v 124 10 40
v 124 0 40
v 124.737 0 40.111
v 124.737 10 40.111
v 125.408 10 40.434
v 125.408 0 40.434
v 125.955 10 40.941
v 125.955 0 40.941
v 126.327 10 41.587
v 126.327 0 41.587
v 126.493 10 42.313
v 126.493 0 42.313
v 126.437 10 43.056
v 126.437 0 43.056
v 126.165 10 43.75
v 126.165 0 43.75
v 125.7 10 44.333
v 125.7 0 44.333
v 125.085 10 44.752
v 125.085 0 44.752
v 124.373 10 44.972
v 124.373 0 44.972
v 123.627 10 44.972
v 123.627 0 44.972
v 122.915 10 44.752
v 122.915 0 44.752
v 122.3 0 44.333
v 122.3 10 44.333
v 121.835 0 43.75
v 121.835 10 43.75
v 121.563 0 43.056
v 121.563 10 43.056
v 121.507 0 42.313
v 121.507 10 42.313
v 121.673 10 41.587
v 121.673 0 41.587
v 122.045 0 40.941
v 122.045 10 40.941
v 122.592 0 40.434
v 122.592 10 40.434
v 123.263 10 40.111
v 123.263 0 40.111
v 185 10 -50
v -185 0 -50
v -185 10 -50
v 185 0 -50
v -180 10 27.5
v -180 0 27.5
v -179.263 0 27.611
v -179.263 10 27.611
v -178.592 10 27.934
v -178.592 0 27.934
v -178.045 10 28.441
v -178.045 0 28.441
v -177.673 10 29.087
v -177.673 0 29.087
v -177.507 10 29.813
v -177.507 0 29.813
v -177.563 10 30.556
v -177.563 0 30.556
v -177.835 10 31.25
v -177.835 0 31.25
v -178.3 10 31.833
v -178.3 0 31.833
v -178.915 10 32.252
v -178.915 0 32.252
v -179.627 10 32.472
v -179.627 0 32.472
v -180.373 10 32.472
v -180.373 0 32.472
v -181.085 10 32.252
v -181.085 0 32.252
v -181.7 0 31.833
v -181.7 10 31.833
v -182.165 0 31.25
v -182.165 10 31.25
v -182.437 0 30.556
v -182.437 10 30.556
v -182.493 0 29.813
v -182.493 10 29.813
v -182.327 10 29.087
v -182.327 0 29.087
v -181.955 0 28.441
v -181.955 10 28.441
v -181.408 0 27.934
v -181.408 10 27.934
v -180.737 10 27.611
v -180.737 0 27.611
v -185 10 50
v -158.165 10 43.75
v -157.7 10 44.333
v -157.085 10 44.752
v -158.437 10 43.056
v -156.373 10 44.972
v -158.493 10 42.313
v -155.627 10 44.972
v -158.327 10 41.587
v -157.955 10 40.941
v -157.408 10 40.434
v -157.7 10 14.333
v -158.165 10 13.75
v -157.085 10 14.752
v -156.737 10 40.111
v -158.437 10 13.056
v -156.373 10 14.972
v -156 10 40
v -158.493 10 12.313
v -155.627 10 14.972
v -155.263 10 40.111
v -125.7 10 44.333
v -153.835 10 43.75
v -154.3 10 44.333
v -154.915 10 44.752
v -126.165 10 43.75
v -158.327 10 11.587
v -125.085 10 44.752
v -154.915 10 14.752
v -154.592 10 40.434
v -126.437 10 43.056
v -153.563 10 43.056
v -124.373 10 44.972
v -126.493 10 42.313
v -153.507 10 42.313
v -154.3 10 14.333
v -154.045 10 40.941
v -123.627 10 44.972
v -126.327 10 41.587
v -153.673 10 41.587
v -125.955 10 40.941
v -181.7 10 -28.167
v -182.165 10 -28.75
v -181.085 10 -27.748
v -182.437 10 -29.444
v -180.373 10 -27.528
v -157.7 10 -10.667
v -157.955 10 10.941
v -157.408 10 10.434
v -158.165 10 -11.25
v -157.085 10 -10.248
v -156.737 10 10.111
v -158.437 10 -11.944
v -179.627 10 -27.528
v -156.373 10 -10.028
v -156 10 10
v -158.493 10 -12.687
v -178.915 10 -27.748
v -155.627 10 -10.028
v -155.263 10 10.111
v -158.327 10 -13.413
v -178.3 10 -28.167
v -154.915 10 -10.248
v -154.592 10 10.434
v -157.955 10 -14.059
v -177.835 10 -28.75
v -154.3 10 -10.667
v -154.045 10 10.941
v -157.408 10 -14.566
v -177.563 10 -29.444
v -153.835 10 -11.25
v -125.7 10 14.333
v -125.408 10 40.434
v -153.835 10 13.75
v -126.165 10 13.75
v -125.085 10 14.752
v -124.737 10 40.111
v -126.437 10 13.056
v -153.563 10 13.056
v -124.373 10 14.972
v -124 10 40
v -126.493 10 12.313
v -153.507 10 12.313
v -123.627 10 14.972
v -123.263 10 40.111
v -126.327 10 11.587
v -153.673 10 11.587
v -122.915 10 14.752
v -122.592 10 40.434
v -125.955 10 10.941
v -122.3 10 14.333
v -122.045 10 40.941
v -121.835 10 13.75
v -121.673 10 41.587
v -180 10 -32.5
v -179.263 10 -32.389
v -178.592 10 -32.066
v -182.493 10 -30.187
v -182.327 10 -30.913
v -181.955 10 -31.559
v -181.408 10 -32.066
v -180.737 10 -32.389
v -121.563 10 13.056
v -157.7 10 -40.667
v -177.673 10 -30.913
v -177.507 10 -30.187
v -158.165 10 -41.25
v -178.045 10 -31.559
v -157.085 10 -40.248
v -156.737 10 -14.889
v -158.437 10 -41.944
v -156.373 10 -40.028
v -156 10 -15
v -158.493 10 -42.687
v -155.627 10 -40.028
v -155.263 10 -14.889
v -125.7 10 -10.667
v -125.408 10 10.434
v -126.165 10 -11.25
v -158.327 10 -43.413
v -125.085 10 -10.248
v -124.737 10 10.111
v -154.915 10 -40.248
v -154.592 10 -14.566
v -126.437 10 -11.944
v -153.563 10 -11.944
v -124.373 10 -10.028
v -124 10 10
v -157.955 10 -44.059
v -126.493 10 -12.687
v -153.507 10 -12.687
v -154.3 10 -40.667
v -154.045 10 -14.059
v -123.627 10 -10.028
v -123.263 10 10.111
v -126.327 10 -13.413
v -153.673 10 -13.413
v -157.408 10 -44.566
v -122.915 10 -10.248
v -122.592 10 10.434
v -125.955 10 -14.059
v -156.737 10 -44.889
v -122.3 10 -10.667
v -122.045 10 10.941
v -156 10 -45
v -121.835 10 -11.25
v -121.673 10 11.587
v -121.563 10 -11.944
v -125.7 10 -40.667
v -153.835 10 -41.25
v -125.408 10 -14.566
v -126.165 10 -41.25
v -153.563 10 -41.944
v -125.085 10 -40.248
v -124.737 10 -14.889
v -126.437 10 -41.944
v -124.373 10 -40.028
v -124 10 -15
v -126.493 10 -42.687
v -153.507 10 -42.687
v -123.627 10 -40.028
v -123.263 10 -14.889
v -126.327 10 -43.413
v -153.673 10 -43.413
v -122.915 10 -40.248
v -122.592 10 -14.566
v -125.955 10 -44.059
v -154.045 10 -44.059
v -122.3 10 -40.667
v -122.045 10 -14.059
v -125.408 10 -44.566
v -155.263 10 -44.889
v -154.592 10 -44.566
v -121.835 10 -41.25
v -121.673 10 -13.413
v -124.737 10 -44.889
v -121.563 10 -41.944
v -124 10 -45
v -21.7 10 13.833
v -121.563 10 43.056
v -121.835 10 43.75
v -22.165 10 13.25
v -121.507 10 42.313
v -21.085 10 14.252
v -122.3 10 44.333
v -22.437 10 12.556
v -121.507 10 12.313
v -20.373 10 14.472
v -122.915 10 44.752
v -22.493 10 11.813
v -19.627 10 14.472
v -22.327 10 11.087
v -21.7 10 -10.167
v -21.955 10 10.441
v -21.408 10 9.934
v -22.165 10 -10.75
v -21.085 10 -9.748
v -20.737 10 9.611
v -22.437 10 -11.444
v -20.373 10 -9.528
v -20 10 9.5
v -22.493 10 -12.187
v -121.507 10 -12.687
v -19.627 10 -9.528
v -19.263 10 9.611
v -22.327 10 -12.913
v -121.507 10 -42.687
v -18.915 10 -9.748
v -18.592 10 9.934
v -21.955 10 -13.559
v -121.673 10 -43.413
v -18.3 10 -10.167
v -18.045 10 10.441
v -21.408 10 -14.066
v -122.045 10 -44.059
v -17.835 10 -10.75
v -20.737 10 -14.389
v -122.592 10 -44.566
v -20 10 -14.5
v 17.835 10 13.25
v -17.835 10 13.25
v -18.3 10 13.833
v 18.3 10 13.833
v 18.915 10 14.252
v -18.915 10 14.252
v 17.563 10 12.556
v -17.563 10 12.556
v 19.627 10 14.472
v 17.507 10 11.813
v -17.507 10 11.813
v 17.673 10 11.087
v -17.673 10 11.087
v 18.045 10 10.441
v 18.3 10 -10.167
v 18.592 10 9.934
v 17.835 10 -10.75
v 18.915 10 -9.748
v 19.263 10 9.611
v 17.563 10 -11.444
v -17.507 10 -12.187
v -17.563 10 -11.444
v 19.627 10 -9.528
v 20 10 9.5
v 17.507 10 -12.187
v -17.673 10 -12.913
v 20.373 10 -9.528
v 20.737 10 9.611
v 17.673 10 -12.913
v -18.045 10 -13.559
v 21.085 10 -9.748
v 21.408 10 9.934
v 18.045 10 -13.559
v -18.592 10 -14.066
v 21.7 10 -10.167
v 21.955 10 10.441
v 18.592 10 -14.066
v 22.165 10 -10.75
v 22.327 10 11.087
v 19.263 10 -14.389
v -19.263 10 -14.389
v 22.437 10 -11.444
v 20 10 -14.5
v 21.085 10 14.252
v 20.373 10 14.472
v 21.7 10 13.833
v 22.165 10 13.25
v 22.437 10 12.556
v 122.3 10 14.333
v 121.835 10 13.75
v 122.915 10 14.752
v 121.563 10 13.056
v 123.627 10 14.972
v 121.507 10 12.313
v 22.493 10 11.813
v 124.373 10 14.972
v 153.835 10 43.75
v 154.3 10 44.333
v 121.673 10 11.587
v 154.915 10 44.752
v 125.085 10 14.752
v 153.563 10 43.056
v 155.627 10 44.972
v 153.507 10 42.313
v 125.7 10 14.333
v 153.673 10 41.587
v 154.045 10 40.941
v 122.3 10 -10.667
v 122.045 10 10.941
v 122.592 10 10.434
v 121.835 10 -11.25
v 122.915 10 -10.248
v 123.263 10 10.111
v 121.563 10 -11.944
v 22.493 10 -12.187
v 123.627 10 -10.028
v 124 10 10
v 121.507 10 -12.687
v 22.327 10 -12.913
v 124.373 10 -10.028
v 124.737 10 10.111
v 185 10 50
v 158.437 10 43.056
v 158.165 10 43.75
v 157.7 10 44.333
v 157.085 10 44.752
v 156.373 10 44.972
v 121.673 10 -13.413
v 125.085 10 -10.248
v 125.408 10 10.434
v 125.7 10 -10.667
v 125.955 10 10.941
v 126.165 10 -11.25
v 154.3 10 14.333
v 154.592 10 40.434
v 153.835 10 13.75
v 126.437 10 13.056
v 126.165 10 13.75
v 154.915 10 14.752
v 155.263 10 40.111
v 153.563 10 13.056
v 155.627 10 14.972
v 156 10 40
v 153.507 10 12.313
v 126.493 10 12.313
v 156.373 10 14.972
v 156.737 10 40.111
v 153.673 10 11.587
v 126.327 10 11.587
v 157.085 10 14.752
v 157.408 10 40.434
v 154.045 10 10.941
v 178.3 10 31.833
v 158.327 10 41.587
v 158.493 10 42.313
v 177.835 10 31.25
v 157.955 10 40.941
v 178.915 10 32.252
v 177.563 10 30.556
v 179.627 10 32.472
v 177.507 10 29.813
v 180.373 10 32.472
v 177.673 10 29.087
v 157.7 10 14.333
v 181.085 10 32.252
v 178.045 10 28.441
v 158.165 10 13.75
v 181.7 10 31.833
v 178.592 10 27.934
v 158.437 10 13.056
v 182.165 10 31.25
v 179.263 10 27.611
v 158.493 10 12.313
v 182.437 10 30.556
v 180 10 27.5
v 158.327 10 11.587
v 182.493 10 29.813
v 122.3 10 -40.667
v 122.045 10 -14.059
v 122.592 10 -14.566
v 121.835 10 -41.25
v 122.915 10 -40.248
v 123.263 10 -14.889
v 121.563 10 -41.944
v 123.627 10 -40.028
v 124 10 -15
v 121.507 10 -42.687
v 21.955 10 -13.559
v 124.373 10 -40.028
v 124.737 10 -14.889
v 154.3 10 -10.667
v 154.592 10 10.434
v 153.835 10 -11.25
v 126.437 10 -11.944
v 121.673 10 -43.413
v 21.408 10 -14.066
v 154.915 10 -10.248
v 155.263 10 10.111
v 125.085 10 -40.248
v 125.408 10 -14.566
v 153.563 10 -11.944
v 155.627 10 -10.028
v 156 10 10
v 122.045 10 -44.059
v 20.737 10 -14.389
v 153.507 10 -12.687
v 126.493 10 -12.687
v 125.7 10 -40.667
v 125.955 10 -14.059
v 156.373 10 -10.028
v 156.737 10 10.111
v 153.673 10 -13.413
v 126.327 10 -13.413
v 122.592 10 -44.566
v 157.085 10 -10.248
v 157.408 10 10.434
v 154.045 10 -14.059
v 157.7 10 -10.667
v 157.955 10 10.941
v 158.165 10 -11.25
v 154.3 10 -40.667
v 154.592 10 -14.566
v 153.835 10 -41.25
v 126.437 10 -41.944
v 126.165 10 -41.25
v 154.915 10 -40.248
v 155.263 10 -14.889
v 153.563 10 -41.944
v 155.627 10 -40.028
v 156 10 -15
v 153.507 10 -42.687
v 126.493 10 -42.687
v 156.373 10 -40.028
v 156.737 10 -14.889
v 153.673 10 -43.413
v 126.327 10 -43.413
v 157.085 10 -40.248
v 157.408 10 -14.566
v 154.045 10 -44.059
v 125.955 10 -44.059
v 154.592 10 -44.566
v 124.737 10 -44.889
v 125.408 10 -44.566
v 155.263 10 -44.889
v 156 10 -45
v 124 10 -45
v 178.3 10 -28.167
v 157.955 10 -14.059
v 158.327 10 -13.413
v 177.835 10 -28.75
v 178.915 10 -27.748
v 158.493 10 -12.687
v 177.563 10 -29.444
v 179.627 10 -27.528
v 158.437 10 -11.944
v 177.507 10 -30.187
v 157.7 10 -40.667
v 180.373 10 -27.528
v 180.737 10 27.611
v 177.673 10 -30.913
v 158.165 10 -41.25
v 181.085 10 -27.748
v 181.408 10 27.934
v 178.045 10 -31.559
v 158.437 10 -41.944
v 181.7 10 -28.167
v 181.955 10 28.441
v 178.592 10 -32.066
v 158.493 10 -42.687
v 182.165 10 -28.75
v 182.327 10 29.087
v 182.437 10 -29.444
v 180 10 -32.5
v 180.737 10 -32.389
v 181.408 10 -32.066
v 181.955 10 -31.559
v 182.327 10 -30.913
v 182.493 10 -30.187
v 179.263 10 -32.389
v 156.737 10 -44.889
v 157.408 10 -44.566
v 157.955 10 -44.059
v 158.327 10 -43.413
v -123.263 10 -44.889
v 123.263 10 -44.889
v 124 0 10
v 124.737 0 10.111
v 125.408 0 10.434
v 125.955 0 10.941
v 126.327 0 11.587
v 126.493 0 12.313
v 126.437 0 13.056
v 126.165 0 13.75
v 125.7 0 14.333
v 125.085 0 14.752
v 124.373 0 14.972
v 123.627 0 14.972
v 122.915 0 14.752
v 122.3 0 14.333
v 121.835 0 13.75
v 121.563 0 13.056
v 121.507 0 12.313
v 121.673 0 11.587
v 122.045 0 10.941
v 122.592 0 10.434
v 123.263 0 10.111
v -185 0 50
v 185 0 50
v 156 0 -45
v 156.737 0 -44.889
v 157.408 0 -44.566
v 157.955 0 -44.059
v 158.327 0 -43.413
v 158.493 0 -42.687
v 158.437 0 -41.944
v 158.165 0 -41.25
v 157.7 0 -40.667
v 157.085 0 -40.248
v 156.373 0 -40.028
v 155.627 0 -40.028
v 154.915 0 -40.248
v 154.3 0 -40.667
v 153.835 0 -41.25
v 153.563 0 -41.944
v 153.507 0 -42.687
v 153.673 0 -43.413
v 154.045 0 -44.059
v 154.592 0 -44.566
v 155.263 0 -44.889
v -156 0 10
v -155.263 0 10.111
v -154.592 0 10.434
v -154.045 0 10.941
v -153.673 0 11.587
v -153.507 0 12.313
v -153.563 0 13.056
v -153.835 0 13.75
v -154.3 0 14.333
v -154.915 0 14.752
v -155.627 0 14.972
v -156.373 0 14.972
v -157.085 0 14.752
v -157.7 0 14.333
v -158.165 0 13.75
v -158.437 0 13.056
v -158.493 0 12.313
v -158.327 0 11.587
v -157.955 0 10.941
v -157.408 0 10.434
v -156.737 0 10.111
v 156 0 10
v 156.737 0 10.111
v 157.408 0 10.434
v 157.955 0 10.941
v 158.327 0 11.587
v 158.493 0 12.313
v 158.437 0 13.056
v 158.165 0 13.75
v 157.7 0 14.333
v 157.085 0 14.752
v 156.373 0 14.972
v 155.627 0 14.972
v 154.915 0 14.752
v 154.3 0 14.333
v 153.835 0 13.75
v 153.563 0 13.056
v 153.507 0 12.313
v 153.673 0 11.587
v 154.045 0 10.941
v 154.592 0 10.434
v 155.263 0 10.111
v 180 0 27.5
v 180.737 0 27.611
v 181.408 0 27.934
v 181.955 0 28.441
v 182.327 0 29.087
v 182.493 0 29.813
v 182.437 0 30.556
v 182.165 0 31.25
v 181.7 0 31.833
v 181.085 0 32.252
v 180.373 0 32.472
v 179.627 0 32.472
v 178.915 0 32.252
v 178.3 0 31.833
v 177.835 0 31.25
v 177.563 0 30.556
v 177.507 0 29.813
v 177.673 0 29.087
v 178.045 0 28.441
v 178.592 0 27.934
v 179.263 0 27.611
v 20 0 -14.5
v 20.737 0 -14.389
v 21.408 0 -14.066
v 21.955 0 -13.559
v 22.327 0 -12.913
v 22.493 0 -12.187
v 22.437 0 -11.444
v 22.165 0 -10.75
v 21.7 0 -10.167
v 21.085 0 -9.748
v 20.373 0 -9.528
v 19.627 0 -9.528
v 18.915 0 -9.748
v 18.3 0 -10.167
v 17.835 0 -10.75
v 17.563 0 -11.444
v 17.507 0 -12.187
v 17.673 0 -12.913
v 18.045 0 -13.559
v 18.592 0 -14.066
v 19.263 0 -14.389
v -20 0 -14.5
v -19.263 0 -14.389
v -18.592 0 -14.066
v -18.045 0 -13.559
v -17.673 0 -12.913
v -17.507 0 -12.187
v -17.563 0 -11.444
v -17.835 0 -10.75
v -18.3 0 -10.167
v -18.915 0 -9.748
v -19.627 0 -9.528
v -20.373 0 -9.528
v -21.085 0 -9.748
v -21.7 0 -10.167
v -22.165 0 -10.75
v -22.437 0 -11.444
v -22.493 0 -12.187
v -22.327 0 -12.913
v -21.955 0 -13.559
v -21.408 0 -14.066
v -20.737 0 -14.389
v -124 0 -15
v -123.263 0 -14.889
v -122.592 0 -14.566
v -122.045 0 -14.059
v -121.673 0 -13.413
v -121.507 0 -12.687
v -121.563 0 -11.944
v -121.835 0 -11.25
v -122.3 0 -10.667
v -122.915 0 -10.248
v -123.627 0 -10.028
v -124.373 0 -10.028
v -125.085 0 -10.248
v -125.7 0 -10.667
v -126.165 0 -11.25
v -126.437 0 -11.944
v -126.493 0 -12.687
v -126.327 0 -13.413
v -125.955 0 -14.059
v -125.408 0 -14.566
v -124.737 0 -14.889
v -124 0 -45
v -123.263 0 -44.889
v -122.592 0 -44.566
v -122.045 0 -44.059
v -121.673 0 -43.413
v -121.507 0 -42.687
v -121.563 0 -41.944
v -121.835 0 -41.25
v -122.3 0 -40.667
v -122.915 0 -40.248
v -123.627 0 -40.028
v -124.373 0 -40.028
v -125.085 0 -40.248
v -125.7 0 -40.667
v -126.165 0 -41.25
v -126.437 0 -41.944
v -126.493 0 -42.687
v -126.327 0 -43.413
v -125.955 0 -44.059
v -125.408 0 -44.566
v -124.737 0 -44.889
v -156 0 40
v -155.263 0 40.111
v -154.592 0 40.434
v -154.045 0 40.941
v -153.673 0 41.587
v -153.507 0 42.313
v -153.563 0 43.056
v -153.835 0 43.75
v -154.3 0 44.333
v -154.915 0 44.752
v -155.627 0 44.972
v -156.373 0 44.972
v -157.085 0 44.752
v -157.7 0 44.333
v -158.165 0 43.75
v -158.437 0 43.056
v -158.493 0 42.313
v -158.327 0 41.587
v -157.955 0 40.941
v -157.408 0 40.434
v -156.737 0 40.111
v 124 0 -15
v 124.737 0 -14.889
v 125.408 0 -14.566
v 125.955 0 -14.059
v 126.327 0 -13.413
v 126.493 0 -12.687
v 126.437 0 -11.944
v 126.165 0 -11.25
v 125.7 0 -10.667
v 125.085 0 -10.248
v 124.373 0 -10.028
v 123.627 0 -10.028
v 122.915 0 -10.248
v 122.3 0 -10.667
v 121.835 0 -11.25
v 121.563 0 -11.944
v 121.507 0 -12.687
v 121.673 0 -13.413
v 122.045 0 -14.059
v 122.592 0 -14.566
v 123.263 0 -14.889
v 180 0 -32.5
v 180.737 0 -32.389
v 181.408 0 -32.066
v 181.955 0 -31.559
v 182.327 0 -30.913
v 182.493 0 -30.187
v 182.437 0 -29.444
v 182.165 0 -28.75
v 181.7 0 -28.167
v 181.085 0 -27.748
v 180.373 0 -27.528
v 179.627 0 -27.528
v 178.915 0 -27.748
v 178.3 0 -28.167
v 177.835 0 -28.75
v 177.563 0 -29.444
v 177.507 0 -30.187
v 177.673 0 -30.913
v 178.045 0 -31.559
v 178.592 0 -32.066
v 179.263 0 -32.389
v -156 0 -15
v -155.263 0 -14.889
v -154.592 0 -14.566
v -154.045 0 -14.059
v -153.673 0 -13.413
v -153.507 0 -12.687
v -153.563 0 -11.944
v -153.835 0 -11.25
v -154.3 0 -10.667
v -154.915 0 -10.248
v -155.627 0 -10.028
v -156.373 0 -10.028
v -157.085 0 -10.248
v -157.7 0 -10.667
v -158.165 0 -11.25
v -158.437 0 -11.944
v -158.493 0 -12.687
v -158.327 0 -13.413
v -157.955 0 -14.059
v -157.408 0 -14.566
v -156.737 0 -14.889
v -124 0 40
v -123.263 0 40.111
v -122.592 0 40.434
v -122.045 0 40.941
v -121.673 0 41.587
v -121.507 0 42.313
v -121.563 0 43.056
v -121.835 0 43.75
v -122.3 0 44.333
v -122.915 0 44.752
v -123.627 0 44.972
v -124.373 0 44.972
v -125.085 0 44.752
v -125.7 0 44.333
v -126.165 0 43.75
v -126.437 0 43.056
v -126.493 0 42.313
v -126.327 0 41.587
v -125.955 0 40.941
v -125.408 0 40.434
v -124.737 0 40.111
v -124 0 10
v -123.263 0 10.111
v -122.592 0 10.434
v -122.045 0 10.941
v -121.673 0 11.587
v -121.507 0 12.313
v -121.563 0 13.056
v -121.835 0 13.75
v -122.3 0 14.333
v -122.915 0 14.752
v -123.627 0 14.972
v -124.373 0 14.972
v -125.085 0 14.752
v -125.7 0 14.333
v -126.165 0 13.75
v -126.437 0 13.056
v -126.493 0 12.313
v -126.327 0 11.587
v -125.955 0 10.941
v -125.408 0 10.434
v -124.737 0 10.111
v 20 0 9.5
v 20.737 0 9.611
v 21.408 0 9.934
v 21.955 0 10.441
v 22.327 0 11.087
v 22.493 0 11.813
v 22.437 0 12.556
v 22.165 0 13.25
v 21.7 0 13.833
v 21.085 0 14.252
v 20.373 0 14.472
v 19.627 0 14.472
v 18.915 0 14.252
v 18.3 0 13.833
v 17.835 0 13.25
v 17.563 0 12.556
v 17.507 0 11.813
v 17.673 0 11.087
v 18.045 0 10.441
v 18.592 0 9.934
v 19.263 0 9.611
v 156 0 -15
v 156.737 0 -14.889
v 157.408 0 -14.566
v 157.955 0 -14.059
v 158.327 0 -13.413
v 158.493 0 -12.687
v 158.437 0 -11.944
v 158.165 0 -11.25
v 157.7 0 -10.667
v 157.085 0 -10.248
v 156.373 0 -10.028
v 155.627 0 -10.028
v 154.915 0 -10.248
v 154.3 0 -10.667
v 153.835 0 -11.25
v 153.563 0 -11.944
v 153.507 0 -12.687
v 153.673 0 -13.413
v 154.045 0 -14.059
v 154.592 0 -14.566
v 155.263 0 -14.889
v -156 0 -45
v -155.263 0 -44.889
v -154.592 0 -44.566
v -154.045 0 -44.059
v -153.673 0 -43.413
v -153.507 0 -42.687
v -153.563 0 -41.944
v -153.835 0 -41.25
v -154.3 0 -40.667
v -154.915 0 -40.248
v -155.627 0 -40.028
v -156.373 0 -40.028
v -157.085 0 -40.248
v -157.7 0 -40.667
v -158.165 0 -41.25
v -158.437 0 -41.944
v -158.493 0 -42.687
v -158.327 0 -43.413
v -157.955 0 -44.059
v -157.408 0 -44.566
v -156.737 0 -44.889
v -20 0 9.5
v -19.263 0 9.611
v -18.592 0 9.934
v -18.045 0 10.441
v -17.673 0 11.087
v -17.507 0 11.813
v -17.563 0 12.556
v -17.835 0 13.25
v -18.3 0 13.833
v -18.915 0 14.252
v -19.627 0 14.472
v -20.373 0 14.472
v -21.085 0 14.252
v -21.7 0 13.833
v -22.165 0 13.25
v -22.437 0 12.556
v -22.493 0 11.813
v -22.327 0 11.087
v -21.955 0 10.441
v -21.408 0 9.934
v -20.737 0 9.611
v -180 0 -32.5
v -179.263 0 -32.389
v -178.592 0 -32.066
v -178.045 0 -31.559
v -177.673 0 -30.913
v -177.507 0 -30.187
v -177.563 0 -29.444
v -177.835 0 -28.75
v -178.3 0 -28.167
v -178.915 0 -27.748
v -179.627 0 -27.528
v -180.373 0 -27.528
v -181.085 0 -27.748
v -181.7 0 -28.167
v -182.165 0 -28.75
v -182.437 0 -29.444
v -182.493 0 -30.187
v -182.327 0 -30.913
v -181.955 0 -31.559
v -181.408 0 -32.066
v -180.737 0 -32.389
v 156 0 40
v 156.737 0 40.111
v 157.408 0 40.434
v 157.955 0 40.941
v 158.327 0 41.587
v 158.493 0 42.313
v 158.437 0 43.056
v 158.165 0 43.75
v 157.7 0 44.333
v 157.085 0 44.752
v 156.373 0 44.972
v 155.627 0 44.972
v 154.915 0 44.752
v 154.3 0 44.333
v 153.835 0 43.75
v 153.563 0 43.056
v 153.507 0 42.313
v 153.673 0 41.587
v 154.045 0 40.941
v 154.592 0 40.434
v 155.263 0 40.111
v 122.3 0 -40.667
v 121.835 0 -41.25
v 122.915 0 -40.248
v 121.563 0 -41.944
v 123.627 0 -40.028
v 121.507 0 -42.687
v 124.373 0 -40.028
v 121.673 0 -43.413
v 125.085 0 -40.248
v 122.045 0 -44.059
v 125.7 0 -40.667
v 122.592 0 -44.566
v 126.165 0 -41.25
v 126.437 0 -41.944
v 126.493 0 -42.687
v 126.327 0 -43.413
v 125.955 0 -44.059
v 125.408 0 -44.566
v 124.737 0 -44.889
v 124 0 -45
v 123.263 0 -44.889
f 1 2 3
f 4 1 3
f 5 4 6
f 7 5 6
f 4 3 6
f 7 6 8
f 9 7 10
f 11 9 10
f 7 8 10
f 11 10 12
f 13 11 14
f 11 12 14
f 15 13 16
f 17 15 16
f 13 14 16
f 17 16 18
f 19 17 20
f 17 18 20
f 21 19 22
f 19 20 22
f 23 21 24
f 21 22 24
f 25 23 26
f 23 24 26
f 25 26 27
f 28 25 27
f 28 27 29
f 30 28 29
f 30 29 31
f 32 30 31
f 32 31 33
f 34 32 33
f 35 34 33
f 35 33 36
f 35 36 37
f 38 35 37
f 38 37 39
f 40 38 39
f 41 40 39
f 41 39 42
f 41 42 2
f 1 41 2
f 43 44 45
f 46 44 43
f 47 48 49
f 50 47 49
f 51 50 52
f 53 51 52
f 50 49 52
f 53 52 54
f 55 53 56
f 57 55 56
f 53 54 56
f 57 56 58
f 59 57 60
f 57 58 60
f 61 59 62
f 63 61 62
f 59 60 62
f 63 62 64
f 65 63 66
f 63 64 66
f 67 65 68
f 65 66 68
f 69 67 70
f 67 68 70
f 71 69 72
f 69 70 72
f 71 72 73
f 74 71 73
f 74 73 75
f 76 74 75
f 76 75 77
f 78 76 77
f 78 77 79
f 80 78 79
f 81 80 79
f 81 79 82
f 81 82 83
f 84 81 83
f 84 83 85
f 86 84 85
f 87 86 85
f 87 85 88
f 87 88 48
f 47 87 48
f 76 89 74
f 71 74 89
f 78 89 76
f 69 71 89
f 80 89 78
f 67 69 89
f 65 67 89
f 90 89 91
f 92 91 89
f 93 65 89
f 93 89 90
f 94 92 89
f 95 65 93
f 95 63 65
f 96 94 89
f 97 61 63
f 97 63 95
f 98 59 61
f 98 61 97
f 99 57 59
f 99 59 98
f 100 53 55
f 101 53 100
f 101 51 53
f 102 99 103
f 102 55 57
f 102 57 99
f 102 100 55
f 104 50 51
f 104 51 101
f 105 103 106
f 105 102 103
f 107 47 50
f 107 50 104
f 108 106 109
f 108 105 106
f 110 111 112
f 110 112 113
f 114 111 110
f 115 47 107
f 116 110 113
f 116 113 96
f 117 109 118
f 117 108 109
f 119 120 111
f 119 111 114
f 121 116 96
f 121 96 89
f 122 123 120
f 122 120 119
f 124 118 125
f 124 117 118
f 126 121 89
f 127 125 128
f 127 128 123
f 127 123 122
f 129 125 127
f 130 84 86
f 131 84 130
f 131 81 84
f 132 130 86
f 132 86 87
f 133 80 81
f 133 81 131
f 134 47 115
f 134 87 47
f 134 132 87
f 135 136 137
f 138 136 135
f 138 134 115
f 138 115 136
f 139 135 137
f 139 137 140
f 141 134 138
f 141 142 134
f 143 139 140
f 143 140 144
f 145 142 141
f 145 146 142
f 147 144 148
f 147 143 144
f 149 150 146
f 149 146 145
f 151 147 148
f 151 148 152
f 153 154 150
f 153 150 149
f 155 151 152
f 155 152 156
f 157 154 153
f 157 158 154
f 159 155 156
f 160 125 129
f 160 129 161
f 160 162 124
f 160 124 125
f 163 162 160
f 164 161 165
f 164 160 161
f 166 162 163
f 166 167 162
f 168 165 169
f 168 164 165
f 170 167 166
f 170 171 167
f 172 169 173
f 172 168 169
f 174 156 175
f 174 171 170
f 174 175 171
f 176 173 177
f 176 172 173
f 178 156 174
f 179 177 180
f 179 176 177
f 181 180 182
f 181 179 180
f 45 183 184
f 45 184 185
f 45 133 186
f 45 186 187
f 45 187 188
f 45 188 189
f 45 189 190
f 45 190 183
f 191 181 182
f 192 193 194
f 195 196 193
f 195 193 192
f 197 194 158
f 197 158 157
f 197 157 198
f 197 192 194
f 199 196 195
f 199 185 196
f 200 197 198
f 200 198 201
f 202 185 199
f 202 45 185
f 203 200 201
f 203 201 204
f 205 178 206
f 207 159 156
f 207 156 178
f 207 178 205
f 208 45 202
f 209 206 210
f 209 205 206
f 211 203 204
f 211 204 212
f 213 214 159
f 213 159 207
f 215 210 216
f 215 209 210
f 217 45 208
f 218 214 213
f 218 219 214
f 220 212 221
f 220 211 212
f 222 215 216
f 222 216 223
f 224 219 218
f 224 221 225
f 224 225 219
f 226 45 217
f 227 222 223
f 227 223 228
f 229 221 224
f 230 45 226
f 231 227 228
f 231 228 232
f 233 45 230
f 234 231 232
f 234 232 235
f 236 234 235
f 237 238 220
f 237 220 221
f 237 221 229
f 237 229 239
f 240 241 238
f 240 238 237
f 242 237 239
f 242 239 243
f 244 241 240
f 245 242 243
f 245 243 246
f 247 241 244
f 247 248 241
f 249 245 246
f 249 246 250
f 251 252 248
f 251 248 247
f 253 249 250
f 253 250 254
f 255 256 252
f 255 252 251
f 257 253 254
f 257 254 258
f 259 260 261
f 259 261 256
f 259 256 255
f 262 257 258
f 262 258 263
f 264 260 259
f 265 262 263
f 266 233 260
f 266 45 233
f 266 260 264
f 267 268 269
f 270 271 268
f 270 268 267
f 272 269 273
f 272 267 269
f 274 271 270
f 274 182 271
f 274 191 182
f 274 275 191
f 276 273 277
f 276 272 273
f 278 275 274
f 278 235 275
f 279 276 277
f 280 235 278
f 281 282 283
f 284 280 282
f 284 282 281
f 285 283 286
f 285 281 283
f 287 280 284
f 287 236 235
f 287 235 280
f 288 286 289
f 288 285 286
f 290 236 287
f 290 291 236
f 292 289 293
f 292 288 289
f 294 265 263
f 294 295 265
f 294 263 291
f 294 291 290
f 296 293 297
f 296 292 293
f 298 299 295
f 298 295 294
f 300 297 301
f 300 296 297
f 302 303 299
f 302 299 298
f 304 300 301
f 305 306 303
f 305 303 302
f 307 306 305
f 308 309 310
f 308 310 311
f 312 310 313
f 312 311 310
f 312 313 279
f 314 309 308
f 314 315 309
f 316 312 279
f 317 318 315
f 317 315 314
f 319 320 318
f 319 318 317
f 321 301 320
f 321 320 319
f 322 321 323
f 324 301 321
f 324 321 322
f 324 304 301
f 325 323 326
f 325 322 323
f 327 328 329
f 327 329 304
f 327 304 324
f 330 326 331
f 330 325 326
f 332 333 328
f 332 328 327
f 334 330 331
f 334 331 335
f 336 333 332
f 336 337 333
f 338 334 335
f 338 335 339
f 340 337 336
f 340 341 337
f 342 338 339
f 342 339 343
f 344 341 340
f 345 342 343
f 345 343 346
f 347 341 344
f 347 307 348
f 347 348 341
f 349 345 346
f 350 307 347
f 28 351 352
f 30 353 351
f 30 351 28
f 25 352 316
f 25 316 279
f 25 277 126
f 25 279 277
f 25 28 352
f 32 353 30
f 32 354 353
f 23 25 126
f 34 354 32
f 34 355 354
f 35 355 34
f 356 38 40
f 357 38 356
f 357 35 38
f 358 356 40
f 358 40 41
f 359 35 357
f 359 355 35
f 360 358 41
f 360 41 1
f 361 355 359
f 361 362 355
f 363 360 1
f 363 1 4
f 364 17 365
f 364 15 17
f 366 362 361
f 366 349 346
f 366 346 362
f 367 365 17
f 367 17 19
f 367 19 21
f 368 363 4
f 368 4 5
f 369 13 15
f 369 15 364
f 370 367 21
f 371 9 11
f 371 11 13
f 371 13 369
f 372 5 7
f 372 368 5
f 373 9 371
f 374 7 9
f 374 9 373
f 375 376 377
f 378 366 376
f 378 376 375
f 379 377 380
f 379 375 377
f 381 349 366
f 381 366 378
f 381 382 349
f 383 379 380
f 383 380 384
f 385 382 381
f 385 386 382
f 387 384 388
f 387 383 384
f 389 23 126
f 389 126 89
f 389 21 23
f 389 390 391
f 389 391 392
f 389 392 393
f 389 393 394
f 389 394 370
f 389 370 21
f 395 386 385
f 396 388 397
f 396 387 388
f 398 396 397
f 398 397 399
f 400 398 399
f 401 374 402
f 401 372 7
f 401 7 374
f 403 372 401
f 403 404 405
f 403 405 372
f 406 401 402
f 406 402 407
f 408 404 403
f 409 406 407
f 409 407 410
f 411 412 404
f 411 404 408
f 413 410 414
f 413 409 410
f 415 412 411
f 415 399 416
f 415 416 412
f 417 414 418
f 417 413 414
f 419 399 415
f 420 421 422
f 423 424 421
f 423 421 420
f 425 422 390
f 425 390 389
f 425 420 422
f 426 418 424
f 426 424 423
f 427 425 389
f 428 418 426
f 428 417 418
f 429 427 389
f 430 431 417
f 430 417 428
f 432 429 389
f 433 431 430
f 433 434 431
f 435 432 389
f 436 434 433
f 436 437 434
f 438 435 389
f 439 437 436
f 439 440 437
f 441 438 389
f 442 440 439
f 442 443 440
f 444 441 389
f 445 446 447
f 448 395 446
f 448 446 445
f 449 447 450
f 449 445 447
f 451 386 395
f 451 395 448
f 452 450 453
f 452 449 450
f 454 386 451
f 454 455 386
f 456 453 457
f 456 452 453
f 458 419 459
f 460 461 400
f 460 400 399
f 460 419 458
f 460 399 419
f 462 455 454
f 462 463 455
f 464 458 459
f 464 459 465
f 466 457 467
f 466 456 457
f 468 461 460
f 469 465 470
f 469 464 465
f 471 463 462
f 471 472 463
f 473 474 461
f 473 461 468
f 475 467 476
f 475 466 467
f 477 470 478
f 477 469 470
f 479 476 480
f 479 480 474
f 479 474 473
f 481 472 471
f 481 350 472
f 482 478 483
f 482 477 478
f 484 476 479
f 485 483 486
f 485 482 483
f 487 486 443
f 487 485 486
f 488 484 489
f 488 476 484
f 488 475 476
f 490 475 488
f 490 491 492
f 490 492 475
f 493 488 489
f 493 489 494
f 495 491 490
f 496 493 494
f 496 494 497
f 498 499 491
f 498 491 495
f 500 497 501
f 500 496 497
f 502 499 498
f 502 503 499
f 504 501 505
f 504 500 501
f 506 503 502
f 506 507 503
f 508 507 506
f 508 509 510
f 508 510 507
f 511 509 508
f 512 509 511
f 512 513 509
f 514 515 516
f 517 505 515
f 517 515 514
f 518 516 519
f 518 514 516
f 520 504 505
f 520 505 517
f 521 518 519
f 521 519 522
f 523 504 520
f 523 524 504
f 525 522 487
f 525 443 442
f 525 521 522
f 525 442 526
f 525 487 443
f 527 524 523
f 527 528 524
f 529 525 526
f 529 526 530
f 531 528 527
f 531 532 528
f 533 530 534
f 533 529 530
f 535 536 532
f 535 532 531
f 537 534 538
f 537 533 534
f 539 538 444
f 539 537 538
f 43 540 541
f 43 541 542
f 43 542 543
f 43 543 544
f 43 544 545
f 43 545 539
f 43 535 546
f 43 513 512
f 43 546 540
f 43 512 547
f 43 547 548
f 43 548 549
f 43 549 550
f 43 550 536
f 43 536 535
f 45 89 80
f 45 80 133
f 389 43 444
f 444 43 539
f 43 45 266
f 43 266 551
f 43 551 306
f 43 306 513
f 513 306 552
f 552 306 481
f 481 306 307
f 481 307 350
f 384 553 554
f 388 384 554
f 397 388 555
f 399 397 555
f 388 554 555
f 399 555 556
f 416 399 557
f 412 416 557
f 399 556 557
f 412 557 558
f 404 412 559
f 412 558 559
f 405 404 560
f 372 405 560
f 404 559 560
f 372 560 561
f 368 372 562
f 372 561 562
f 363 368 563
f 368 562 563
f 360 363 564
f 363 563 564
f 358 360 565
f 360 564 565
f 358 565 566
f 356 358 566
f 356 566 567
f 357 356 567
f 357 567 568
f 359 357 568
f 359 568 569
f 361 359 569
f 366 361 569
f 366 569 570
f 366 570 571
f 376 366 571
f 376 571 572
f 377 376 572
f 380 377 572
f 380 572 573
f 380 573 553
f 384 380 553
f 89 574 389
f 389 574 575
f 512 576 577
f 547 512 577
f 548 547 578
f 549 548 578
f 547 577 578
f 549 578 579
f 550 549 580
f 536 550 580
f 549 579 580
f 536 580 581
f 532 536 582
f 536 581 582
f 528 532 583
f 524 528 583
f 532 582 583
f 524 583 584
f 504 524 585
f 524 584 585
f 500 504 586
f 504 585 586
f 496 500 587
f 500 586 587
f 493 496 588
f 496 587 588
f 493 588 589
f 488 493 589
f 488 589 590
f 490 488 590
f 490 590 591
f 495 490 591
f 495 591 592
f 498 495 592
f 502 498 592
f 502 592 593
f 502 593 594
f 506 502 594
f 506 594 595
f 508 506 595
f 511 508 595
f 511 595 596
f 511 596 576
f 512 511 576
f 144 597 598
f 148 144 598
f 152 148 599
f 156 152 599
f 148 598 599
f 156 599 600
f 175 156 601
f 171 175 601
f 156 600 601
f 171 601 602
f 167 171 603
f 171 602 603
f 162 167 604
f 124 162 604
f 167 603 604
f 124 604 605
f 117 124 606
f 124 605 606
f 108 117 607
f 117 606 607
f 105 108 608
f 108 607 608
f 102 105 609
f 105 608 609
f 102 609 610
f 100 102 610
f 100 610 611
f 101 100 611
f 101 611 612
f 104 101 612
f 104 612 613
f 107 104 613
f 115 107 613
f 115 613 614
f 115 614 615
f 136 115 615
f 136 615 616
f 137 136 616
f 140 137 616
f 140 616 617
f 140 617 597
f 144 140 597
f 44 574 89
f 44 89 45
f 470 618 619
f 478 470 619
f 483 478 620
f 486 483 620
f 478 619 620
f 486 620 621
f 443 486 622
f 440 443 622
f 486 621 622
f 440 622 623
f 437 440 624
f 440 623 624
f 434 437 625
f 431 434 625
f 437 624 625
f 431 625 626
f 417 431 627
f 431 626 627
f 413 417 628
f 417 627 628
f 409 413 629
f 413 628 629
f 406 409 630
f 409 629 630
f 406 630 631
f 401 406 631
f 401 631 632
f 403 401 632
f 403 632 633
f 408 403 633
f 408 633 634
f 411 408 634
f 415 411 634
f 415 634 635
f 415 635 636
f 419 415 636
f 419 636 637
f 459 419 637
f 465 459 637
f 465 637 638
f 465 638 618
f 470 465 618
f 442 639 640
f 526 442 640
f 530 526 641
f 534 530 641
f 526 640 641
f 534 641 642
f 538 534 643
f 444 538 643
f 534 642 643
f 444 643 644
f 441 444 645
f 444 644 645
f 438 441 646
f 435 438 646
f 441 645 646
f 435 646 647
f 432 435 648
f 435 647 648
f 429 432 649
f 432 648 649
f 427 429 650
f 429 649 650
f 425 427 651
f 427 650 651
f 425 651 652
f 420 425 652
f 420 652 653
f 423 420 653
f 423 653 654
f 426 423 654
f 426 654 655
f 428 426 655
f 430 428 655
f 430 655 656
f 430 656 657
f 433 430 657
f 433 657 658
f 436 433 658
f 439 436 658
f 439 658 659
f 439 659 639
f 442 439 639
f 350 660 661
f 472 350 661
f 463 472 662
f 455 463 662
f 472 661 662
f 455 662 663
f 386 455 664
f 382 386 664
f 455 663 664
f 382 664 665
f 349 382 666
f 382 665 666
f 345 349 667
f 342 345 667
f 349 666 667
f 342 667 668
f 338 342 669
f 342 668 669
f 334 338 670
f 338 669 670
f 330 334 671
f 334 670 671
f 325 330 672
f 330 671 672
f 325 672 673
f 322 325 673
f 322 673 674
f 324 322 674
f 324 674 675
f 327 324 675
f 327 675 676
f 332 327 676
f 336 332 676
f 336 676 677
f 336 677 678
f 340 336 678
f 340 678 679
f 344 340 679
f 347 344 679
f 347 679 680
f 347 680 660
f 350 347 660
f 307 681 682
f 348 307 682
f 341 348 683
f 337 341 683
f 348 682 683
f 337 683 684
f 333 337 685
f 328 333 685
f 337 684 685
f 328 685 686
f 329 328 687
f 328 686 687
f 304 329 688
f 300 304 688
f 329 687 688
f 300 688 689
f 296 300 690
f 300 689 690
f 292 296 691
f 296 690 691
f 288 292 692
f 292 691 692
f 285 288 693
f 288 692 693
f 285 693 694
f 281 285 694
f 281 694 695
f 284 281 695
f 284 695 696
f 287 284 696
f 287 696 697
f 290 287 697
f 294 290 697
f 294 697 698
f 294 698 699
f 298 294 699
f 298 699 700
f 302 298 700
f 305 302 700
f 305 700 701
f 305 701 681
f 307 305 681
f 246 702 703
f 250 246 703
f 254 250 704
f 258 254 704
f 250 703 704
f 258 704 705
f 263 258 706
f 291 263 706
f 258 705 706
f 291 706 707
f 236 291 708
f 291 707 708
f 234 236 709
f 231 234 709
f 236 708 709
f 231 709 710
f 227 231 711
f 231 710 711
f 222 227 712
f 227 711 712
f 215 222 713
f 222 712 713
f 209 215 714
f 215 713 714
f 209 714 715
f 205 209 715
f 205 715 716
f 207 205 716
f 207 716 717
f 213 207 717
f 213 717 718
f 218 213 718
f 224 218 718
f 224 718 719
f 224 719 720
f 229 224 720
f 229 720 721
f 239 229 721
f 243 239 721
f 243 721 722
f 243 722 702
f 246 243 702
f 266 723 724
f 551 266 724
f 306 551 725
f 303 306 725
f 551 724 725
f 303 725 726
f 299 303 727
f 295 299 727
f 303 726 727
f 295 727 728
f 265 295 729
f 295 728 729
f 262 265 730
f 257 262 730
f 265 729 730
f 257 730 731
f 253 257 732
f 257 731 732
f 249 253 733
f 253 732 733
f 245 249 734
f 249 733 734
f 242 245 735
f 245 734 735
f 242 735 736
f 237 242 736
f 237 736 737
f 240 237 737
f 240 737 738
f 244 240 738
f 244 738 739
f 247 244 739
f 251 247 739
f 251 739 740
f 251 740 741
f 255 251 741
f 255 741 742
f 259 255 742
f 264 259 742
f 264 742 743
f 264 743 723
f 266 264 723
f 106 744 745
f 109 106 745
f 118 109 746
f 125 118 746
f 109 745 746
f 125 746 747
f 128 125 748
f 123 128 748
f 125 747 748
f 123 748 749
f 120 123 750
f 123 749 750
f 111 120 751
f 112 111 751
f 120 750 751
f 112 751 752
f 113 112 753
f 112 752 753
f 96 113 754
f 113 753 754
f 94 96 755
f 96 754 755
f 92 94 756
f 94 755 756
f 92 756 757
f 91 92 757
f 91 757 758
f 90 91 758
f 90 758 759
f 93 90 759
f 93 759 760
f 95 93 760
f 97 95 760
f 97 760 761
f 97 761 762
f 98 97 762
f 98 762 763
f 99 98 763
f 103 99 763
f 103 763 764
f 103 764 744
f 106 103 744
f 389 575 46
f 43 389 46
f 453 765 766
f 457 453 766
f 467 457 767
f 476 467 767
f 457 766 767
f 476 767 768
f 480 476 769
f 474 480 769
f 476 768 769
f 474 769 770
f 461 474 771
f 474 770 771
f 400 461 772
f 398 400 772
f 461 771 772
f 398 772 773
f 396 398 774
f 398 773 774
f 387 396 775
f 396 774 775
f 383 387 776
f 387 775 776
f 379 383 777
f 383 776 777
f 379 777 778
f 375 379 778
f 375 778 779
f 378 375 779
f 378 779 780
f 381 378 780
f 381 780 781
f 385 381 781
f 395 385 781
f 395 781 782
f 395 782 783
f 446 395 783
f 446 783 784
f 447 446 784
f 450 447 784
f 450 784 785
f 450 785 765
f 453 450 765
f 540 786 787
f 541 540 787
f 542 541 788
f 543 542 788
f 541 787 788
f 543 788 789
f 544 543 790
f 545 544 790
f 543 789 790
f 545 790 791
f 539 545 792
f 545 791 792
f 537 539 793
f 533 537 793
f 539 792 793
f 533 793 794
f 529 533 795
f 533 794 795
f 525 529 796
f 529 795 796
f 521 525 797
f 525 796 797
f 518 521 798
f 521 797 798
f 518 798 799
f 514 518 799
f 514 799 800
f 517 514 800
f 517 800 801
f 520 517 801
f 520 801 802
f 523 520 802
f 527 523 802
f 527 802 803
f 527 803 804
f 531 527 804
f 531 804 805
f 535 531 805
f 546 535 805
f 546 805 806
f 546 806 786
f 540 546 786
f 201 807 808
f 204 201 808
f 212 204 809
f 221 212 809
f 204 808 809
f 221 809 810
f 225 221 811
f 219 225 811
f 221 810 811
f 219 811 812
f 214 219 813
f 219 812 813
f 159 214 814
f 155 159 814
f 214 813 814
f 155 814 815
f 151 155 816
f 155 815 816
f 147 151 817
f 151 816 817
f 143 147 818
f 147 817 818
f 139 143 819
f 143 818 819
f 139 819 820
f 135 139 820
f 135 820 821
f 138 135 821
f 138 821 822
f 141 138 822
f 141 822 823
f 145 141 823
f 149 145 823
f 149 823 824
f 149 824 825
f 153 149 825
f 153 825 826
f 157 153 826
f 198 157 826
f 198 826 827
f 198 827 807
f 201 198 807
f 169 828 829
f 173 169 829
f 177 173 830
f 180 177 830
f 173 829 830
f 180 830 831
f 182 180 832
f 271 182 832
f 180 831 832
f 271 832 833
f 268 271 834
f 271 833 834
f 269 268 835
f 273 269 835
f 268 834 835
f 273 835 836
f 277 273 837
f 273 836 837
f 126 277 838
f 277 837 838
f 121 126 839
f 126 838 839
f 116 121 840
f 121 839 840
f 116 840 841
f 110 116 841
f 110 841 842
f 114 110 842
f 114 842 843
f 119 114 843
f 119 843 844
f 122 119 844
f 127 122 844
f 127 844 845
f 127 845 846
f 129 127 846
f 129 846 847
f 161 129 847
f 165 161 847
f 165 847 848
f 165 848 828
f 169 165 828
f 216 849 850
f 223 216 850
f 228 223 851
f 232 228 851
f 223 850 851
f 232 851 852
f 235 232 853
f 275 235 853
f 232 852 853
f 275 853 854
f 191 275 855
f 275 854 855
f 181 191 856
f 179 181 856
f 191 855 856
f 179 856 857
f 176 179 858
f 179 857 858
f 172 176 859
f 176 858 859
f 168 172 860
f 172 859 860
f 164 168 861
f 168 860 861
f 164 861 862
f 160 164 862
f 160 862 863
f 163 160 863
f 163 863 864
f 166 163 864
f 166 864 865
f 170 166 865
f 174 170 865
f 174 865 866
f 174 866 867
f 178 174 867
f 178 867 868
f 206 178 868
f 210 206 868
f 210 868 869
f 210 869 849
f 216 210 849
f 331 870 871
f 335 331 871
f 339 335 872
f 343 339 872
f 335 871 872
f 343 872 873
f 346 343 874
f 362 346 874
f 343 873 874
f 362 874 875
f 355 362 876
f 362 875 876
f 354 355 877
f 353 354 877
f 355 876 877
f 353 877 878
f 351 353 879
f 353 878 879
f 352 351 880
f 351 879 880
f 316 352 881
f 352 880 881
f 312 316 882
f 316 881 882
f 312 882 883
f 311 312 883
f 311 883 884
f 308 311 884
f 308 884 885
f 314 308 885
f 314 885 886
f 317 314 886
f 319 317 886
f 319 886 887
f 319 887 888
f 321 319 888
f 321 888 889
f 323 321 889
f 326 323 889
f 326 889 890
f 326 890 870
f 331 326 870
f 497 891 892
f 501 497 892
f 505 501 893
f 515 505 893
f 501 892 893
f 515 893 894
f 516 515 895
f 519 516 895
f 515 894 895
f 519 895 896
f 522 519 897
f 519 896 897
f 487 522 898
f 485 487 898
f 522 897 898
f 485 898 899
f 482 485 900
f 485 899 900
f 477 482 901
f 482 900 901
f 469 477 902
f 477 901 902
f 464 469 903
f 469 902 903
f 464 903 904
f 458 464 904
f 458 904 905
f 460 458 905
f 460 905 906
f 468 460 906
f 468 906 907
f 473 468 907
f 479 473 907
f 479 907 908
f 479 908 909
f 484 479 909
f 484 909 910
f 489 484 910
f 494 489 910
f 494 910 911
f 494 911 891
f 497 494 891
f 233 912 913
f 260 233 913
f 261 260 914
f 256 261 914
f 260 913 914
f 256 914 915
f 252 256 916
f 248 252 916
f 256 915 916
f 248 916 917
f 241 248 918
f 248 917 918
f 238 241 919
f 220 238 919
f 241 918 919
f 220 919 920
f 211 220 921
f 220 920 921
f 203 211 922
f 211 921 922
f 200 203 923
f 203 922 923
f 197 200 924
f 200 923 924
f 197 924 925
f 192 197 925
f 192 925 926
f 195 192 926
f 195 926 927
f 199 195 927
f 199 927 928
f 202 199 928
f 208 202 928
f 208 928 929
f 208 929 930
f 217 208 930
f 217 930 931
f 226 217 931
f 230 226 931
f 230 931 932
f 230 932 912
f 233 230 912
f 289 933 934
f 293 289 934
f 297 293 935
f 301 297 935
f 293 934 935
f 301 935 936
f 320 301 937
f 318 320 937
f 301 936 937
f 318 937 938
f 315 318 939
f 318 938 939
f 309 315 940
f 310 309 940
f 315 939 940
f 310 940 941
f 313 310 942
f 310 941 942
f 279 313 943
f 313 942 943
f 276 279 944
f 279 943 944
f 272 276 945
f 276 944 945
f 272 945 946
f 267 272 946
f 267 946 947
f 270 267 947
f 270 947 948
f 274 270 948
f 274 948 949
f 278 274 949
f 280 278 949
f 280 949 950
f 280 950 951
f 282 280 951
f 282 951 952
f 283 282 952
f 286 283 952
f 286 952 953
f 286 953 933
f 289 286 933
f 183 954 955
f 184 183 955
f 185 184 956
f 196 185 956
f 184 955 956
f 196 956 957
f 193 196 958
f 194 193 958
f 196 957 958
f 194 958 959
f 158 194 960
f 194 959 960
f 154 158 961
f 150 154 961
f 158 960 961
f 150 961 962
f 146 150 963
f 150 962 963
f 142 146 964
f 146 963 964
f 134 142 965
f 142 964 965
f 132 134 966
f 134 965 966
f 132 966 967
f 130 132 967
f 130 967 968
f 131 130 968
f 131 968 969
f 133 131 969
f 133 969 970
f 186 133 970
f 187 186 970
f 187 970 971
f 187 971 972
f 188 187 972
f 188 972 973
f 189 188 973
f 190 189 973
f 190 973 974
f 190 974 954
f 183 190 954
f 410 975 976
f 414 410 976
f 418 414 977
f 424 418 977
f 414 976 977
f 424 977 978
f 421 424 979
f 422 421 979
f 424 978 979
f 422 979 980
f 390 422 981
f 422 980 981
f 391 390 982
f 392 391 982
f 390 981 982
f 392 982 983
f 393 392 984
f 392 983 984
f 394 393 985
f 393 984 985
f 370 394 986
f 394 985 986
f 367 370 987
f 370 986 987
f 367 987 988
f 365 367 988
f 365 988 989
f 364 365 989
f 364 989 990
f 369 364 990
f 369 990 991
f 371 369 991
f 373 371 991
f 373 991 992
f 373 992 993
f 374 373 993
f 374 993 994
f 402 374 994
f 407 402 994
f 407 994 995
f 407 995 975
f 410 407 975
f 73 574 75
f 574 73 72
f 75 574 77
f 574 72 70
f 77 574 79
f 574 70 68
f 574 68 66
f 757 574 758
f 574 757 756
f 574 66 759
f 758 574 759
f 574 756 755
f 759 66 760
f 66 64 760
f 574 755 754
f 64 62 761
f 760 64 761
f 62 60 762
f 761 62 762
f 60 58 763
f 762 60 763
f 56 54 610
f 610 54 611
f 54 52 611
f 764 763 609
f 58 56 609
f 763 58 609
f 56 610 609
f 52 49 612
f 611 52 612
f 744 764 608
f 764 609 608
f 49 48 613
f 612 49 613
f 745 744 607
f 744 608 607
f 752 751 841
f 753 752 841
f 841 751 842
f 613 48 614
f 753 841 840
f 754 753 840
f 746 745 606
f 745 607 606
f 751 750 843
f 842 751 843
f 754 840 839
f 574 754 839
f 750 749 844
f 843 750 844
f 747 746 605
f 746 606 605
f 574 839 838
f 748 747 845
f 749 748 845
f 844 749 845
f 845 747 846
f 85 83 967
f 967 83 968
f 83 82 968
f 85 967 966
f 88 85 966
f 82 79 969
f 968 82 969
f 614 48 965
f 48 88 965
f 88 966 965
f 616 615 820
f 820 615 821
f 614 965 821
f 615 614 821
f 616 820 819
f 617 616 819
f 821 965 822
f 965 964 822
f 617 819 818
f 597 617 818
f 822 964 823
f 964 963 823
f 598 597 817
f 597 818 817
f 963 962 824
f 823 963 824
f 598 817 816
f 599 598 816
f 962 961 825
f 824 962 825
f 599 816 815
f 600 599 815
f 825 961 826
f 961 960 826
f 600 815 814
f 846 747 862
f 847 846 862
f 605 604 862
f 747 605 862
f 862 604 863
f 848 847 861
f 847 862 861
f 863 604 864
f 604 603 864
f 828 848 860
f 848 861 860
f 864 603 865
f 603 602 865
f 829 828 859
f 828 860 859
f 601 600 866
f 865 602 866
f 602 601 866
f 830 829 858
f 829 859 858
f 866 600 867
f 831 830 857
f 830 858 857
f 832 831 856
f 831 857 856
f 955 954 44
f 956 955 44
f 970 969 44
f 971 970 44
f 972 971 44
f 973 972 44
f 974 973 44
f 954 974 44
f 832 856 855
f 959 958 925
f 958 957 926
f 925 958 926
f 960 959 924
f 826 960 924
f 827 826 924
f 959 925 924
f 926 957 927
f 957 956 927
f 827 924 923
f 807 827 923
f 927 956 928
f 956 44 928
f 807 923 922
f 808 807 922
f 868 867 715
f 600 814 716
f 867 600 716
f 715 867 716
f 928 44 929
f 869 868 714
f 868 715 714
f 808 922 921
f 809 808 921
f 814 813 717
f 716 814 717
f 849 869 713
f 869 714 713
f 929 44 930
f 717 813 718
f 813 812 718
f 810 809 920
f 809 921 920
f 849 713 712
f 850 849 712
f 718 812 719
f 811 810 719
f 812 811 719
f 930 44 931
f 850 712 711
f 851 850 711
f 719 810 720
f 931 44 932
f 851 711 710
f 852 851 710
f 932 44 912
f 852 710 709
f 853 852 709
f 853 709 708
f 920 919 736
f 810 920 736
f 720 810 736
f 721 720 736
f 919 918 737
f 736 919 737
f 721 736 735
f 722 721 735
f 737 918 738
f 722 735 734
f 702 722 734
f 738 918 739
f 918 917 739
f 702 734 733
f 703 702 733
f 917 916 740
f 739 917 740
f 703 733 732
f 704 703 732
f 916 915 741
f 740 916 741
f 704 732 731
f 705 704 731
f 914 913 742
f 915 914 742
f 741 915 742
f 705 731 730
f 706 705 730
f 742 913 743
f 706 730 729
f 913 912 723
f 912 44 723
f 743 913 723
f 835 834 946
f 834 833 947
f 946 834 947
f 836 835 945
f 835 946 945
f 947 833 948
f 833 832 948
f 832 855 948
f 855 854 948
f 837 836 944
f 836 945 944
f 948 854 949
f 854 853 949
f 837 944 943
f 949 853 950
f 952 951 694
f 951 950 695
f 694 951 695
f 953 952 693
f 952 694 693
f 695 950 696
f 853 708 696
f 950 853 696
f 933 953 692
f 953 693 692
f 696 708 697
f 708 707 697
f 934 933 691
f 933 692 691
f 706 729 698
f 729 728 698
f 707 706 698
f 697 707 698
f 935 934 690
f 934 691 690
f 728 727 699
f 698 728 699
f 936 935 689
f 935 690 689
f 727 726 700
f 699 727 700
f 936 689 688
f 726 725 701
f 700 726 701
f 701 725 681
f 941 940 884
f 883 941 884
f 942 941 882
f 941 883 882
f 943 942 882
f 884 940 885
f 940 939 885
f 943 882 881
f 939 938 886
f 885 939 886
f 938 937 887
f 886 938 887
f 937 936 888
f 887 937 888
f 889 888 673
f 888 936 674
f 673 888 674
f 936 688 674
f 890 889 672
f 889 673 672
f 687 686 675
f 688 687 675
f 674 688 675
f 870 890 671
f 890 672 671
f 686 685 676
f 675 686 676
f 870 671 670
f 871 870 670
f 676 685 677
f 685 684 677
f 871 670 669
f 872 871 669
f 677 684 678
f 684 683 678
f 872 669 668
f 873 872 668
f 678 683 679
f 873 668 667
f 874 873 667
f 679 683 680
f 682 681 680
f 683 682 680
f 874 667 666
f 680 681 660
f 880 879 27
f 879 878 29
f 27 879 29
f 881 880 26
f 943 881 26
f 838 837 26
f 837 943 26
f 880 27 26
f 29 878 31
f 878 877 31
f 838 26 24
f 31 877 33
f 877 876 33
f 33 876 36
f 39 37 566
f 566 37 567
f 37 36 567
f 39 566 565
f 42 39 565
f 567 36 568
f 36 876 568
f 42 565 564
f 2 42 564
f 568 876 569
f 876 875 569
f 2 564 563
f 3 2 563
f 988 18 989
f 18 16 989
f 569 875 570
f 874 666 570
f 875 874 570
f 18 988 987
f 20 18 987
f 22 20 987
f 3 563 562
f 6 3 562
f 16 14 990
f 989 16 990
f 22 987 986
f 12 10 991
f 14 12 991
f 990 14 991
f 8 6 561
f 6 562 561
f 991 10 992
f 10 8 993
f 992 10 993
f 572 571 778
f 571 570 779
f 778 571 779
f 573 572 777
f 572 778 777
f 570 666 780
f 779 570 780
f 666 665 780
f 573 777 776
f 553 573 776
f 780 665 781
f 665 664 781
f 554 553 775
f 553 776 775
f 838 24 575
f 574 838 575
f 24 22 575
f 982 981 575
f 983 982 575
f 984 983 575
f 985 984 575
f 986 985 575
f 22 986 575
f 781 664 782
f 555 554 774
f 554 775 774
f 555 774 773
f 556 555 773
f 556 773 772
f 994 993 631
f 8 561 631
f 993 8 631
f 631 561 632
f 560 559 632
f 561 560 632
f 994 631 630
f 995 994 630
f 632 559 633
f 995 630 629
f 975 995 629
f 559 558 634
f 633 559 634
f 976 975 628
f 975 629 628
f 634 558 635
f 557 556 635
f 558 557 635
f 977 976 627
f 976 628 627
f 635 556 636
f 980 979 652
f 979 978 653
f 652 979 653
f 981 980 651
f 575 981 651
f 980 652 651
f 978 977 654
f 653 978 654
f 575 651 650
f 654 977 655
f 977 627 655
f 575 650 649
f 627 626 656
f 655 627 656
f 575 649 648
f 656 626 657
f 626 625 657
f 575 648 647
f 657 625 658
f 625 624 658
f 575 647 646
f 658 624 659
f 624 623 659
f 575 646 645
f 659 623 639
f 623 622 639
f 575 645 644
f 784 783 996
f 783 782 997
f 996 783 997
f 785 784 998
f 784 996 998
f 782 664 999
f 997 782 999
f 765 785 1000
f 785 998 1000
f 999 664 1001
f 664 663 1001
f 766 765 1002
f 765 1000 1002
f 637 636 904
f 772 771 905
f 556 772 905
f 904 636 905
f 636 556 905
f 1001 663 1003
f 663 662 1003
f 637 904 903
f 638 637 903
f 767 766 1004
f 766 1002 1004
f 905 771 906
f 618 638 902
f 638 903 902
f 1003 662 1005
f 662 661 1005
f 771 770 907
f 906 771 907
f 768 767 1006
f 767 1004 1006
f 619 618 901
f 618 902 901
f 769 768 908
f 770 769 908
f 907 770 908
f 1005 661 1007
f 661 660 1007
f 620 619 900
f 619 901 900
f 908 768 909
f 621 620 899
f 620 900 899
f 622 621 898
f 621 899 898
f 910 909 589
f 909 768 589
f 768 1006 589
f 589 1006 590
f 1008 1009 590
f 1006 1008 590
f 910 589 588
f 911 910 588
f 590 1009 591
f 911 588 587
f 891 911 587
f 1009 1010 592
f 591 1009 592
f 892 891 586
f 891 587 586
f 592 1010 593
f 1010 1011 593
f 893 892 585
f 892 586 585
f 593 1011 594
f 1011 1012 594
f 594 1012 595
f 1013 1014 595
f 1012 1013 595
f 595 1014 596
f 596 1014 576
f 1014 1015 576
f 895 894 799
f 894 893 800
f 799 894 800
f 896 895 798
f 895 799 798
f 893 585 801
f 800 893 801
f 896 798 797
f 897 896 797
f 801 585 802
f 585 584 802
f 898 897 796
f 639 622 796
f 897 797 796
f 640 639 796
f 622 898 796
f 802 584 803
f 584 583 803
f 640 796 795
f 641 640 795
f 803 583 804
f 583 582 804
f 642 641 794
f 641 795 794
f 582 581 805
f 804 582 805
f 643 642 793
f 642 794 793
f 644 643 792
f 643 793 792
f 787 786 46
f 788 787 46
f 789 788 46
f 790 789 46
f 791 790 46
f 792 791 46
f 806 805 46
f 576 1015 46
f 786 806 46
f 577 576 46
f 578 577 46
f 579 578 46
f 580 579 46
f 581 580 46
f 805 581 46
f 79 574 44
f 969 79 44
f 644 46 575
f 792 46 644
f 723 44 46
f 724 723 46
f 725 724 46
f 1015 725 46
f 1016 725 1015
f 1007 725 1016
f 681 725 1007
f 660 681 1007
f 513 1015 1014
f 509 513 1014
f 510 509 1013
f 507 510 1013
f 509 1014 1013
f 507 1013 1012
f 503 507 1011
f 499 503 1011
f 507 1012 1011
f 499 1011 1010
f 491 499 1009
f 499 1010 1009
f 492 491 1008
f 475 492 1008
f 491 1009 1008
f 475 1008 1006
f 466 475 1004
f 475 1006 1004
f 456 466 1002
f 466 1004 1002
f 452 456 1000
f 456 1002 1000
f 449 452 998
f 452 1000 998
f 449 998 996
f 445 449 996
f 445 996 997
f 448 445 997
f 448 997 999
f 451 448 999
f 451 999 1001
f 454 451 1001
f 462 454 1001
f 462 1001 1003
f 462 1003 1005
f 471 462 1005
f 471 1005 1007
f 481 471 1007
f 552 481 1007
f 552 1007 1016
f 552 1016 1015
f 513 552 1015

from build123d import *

# Parameters (mm, degrees)
SKETCH1_W           = 370
SKETCH1_H           = 100
BOSS_EXTRUDE1_DEPTH = 10
SKETCH3_R           = 2.5
CUT_EXTRUDE1_DEPTH  = 192.898410624


with BuildPart() as part:
    # Sketch1 → Boss-Extrude1 (new body)
    with BuildSketch(Plane(origin=(0, 0, 0), x_dir=(1, 0, 0), z_dir=(0, 1, 0))):
        Rectangle(SKETCH1_W, SKETCH1_H)
    extrude(amount=BOSS_EXTRUDE1_DEPTH)

    # Sketch3 → Cut-Extrude1 (cut, through all)
    with BuildSketch(Plane.XZ):
        with Locations(Location((-156, 42.5, 0), (0, 0, 270))):
            Circle(SKETCH3_R)
        with Locations(Location((-124, 42.5, 0), (0, 0, 270))):
            Circle(SKETCH3_R)
        with Locations(Location((124, 42.5, 0), (0, 0, 270))):
            Circle(SKETCH3_R)
        with Locations(Location((156, 42.5, 0), (0, 0, 270))):
            Circle(SKETCH3_R)
        with Locations(Location((-156, 12.5, 0), (0, 0, 270))):
            Circle(SKETCH3_R)
        with Locations(Location((-124, 12.5, 0), (0, 0, 270))):
            Circle(SKETCH3_R)
        with Locations(Location((124, 12.5, 0), (0, 0, 270))):
            Circle(SKETCH3_R)
        with Locations(Location((156, 12.5, 0), (0, 0, 270))):
            Circle(SKETCH3_R)
        with Locations(Location((-156, -12.5, 0), (0, 0, 270))):
            Circle(SKETCH3_R)
        with Locations(Location((-124, -12.5, 0), (0, 0, 270))):
            Circle(SKETCH3_R)
        with Locations(Location((124, -12.5, 0), (0, 0, 270))):
            Circle(SKETCH3_R)
        with Locations(Location((156, -12.5, 0), (0, 0, 270))):
            Circle(SKETCH3_R)
        with Locations(Location((-156, -42.5, 0), (0, 0, 270))):
            Circle(SKETCH3_R)
        with Locations(Location((-124, -42.5, 0), (0, 0, 270))):
            Circle(SKETCH3_R)
        with Locations(Location((124, -42.5, 0), (0, 0, 270))):
            Circle(SKETCH3_R)
        with Locations(Location((156, -42.5, 0), (0, 0, 270))):
            Circle(SKETCH3_R)
        with Locations(Location((-20, 12, 0), (0, 0, 270))):
            Circle(SKETCH3_R)
        with Locations(Location((20, 12, 0), (0, 0, 270))):
            Circle(SKETCH3_R)
        with Locations(Location((20, -12, 0), (0, 0, 270))):
            Circle(SKETCH3_R)
        with Locations(Location((-20, -12, 0), (0, 0, 270))):
            Circle(SKETCH3_R)
        with Locations(Location((-180, 30, 0), (0, 0, 270))):
            Circle(SKETCH3_R)
        with Locations(Location((-180, -30, 0), (0, 0, 270))):
            Circle(SKETCH3_R)
        with Locations(Location((180, -30, 0), (0, 0, 270))):
            Circle(SKETCH3_R)
        with Locations(Location((180, 30, 0), (0, 0, 270))):
            Circle(SKETCH3_R)
    extrude(amount=-CUT_EXTRUDE1_DEPTH, mode=Mode.SUBTRACT)


solid = part.part
